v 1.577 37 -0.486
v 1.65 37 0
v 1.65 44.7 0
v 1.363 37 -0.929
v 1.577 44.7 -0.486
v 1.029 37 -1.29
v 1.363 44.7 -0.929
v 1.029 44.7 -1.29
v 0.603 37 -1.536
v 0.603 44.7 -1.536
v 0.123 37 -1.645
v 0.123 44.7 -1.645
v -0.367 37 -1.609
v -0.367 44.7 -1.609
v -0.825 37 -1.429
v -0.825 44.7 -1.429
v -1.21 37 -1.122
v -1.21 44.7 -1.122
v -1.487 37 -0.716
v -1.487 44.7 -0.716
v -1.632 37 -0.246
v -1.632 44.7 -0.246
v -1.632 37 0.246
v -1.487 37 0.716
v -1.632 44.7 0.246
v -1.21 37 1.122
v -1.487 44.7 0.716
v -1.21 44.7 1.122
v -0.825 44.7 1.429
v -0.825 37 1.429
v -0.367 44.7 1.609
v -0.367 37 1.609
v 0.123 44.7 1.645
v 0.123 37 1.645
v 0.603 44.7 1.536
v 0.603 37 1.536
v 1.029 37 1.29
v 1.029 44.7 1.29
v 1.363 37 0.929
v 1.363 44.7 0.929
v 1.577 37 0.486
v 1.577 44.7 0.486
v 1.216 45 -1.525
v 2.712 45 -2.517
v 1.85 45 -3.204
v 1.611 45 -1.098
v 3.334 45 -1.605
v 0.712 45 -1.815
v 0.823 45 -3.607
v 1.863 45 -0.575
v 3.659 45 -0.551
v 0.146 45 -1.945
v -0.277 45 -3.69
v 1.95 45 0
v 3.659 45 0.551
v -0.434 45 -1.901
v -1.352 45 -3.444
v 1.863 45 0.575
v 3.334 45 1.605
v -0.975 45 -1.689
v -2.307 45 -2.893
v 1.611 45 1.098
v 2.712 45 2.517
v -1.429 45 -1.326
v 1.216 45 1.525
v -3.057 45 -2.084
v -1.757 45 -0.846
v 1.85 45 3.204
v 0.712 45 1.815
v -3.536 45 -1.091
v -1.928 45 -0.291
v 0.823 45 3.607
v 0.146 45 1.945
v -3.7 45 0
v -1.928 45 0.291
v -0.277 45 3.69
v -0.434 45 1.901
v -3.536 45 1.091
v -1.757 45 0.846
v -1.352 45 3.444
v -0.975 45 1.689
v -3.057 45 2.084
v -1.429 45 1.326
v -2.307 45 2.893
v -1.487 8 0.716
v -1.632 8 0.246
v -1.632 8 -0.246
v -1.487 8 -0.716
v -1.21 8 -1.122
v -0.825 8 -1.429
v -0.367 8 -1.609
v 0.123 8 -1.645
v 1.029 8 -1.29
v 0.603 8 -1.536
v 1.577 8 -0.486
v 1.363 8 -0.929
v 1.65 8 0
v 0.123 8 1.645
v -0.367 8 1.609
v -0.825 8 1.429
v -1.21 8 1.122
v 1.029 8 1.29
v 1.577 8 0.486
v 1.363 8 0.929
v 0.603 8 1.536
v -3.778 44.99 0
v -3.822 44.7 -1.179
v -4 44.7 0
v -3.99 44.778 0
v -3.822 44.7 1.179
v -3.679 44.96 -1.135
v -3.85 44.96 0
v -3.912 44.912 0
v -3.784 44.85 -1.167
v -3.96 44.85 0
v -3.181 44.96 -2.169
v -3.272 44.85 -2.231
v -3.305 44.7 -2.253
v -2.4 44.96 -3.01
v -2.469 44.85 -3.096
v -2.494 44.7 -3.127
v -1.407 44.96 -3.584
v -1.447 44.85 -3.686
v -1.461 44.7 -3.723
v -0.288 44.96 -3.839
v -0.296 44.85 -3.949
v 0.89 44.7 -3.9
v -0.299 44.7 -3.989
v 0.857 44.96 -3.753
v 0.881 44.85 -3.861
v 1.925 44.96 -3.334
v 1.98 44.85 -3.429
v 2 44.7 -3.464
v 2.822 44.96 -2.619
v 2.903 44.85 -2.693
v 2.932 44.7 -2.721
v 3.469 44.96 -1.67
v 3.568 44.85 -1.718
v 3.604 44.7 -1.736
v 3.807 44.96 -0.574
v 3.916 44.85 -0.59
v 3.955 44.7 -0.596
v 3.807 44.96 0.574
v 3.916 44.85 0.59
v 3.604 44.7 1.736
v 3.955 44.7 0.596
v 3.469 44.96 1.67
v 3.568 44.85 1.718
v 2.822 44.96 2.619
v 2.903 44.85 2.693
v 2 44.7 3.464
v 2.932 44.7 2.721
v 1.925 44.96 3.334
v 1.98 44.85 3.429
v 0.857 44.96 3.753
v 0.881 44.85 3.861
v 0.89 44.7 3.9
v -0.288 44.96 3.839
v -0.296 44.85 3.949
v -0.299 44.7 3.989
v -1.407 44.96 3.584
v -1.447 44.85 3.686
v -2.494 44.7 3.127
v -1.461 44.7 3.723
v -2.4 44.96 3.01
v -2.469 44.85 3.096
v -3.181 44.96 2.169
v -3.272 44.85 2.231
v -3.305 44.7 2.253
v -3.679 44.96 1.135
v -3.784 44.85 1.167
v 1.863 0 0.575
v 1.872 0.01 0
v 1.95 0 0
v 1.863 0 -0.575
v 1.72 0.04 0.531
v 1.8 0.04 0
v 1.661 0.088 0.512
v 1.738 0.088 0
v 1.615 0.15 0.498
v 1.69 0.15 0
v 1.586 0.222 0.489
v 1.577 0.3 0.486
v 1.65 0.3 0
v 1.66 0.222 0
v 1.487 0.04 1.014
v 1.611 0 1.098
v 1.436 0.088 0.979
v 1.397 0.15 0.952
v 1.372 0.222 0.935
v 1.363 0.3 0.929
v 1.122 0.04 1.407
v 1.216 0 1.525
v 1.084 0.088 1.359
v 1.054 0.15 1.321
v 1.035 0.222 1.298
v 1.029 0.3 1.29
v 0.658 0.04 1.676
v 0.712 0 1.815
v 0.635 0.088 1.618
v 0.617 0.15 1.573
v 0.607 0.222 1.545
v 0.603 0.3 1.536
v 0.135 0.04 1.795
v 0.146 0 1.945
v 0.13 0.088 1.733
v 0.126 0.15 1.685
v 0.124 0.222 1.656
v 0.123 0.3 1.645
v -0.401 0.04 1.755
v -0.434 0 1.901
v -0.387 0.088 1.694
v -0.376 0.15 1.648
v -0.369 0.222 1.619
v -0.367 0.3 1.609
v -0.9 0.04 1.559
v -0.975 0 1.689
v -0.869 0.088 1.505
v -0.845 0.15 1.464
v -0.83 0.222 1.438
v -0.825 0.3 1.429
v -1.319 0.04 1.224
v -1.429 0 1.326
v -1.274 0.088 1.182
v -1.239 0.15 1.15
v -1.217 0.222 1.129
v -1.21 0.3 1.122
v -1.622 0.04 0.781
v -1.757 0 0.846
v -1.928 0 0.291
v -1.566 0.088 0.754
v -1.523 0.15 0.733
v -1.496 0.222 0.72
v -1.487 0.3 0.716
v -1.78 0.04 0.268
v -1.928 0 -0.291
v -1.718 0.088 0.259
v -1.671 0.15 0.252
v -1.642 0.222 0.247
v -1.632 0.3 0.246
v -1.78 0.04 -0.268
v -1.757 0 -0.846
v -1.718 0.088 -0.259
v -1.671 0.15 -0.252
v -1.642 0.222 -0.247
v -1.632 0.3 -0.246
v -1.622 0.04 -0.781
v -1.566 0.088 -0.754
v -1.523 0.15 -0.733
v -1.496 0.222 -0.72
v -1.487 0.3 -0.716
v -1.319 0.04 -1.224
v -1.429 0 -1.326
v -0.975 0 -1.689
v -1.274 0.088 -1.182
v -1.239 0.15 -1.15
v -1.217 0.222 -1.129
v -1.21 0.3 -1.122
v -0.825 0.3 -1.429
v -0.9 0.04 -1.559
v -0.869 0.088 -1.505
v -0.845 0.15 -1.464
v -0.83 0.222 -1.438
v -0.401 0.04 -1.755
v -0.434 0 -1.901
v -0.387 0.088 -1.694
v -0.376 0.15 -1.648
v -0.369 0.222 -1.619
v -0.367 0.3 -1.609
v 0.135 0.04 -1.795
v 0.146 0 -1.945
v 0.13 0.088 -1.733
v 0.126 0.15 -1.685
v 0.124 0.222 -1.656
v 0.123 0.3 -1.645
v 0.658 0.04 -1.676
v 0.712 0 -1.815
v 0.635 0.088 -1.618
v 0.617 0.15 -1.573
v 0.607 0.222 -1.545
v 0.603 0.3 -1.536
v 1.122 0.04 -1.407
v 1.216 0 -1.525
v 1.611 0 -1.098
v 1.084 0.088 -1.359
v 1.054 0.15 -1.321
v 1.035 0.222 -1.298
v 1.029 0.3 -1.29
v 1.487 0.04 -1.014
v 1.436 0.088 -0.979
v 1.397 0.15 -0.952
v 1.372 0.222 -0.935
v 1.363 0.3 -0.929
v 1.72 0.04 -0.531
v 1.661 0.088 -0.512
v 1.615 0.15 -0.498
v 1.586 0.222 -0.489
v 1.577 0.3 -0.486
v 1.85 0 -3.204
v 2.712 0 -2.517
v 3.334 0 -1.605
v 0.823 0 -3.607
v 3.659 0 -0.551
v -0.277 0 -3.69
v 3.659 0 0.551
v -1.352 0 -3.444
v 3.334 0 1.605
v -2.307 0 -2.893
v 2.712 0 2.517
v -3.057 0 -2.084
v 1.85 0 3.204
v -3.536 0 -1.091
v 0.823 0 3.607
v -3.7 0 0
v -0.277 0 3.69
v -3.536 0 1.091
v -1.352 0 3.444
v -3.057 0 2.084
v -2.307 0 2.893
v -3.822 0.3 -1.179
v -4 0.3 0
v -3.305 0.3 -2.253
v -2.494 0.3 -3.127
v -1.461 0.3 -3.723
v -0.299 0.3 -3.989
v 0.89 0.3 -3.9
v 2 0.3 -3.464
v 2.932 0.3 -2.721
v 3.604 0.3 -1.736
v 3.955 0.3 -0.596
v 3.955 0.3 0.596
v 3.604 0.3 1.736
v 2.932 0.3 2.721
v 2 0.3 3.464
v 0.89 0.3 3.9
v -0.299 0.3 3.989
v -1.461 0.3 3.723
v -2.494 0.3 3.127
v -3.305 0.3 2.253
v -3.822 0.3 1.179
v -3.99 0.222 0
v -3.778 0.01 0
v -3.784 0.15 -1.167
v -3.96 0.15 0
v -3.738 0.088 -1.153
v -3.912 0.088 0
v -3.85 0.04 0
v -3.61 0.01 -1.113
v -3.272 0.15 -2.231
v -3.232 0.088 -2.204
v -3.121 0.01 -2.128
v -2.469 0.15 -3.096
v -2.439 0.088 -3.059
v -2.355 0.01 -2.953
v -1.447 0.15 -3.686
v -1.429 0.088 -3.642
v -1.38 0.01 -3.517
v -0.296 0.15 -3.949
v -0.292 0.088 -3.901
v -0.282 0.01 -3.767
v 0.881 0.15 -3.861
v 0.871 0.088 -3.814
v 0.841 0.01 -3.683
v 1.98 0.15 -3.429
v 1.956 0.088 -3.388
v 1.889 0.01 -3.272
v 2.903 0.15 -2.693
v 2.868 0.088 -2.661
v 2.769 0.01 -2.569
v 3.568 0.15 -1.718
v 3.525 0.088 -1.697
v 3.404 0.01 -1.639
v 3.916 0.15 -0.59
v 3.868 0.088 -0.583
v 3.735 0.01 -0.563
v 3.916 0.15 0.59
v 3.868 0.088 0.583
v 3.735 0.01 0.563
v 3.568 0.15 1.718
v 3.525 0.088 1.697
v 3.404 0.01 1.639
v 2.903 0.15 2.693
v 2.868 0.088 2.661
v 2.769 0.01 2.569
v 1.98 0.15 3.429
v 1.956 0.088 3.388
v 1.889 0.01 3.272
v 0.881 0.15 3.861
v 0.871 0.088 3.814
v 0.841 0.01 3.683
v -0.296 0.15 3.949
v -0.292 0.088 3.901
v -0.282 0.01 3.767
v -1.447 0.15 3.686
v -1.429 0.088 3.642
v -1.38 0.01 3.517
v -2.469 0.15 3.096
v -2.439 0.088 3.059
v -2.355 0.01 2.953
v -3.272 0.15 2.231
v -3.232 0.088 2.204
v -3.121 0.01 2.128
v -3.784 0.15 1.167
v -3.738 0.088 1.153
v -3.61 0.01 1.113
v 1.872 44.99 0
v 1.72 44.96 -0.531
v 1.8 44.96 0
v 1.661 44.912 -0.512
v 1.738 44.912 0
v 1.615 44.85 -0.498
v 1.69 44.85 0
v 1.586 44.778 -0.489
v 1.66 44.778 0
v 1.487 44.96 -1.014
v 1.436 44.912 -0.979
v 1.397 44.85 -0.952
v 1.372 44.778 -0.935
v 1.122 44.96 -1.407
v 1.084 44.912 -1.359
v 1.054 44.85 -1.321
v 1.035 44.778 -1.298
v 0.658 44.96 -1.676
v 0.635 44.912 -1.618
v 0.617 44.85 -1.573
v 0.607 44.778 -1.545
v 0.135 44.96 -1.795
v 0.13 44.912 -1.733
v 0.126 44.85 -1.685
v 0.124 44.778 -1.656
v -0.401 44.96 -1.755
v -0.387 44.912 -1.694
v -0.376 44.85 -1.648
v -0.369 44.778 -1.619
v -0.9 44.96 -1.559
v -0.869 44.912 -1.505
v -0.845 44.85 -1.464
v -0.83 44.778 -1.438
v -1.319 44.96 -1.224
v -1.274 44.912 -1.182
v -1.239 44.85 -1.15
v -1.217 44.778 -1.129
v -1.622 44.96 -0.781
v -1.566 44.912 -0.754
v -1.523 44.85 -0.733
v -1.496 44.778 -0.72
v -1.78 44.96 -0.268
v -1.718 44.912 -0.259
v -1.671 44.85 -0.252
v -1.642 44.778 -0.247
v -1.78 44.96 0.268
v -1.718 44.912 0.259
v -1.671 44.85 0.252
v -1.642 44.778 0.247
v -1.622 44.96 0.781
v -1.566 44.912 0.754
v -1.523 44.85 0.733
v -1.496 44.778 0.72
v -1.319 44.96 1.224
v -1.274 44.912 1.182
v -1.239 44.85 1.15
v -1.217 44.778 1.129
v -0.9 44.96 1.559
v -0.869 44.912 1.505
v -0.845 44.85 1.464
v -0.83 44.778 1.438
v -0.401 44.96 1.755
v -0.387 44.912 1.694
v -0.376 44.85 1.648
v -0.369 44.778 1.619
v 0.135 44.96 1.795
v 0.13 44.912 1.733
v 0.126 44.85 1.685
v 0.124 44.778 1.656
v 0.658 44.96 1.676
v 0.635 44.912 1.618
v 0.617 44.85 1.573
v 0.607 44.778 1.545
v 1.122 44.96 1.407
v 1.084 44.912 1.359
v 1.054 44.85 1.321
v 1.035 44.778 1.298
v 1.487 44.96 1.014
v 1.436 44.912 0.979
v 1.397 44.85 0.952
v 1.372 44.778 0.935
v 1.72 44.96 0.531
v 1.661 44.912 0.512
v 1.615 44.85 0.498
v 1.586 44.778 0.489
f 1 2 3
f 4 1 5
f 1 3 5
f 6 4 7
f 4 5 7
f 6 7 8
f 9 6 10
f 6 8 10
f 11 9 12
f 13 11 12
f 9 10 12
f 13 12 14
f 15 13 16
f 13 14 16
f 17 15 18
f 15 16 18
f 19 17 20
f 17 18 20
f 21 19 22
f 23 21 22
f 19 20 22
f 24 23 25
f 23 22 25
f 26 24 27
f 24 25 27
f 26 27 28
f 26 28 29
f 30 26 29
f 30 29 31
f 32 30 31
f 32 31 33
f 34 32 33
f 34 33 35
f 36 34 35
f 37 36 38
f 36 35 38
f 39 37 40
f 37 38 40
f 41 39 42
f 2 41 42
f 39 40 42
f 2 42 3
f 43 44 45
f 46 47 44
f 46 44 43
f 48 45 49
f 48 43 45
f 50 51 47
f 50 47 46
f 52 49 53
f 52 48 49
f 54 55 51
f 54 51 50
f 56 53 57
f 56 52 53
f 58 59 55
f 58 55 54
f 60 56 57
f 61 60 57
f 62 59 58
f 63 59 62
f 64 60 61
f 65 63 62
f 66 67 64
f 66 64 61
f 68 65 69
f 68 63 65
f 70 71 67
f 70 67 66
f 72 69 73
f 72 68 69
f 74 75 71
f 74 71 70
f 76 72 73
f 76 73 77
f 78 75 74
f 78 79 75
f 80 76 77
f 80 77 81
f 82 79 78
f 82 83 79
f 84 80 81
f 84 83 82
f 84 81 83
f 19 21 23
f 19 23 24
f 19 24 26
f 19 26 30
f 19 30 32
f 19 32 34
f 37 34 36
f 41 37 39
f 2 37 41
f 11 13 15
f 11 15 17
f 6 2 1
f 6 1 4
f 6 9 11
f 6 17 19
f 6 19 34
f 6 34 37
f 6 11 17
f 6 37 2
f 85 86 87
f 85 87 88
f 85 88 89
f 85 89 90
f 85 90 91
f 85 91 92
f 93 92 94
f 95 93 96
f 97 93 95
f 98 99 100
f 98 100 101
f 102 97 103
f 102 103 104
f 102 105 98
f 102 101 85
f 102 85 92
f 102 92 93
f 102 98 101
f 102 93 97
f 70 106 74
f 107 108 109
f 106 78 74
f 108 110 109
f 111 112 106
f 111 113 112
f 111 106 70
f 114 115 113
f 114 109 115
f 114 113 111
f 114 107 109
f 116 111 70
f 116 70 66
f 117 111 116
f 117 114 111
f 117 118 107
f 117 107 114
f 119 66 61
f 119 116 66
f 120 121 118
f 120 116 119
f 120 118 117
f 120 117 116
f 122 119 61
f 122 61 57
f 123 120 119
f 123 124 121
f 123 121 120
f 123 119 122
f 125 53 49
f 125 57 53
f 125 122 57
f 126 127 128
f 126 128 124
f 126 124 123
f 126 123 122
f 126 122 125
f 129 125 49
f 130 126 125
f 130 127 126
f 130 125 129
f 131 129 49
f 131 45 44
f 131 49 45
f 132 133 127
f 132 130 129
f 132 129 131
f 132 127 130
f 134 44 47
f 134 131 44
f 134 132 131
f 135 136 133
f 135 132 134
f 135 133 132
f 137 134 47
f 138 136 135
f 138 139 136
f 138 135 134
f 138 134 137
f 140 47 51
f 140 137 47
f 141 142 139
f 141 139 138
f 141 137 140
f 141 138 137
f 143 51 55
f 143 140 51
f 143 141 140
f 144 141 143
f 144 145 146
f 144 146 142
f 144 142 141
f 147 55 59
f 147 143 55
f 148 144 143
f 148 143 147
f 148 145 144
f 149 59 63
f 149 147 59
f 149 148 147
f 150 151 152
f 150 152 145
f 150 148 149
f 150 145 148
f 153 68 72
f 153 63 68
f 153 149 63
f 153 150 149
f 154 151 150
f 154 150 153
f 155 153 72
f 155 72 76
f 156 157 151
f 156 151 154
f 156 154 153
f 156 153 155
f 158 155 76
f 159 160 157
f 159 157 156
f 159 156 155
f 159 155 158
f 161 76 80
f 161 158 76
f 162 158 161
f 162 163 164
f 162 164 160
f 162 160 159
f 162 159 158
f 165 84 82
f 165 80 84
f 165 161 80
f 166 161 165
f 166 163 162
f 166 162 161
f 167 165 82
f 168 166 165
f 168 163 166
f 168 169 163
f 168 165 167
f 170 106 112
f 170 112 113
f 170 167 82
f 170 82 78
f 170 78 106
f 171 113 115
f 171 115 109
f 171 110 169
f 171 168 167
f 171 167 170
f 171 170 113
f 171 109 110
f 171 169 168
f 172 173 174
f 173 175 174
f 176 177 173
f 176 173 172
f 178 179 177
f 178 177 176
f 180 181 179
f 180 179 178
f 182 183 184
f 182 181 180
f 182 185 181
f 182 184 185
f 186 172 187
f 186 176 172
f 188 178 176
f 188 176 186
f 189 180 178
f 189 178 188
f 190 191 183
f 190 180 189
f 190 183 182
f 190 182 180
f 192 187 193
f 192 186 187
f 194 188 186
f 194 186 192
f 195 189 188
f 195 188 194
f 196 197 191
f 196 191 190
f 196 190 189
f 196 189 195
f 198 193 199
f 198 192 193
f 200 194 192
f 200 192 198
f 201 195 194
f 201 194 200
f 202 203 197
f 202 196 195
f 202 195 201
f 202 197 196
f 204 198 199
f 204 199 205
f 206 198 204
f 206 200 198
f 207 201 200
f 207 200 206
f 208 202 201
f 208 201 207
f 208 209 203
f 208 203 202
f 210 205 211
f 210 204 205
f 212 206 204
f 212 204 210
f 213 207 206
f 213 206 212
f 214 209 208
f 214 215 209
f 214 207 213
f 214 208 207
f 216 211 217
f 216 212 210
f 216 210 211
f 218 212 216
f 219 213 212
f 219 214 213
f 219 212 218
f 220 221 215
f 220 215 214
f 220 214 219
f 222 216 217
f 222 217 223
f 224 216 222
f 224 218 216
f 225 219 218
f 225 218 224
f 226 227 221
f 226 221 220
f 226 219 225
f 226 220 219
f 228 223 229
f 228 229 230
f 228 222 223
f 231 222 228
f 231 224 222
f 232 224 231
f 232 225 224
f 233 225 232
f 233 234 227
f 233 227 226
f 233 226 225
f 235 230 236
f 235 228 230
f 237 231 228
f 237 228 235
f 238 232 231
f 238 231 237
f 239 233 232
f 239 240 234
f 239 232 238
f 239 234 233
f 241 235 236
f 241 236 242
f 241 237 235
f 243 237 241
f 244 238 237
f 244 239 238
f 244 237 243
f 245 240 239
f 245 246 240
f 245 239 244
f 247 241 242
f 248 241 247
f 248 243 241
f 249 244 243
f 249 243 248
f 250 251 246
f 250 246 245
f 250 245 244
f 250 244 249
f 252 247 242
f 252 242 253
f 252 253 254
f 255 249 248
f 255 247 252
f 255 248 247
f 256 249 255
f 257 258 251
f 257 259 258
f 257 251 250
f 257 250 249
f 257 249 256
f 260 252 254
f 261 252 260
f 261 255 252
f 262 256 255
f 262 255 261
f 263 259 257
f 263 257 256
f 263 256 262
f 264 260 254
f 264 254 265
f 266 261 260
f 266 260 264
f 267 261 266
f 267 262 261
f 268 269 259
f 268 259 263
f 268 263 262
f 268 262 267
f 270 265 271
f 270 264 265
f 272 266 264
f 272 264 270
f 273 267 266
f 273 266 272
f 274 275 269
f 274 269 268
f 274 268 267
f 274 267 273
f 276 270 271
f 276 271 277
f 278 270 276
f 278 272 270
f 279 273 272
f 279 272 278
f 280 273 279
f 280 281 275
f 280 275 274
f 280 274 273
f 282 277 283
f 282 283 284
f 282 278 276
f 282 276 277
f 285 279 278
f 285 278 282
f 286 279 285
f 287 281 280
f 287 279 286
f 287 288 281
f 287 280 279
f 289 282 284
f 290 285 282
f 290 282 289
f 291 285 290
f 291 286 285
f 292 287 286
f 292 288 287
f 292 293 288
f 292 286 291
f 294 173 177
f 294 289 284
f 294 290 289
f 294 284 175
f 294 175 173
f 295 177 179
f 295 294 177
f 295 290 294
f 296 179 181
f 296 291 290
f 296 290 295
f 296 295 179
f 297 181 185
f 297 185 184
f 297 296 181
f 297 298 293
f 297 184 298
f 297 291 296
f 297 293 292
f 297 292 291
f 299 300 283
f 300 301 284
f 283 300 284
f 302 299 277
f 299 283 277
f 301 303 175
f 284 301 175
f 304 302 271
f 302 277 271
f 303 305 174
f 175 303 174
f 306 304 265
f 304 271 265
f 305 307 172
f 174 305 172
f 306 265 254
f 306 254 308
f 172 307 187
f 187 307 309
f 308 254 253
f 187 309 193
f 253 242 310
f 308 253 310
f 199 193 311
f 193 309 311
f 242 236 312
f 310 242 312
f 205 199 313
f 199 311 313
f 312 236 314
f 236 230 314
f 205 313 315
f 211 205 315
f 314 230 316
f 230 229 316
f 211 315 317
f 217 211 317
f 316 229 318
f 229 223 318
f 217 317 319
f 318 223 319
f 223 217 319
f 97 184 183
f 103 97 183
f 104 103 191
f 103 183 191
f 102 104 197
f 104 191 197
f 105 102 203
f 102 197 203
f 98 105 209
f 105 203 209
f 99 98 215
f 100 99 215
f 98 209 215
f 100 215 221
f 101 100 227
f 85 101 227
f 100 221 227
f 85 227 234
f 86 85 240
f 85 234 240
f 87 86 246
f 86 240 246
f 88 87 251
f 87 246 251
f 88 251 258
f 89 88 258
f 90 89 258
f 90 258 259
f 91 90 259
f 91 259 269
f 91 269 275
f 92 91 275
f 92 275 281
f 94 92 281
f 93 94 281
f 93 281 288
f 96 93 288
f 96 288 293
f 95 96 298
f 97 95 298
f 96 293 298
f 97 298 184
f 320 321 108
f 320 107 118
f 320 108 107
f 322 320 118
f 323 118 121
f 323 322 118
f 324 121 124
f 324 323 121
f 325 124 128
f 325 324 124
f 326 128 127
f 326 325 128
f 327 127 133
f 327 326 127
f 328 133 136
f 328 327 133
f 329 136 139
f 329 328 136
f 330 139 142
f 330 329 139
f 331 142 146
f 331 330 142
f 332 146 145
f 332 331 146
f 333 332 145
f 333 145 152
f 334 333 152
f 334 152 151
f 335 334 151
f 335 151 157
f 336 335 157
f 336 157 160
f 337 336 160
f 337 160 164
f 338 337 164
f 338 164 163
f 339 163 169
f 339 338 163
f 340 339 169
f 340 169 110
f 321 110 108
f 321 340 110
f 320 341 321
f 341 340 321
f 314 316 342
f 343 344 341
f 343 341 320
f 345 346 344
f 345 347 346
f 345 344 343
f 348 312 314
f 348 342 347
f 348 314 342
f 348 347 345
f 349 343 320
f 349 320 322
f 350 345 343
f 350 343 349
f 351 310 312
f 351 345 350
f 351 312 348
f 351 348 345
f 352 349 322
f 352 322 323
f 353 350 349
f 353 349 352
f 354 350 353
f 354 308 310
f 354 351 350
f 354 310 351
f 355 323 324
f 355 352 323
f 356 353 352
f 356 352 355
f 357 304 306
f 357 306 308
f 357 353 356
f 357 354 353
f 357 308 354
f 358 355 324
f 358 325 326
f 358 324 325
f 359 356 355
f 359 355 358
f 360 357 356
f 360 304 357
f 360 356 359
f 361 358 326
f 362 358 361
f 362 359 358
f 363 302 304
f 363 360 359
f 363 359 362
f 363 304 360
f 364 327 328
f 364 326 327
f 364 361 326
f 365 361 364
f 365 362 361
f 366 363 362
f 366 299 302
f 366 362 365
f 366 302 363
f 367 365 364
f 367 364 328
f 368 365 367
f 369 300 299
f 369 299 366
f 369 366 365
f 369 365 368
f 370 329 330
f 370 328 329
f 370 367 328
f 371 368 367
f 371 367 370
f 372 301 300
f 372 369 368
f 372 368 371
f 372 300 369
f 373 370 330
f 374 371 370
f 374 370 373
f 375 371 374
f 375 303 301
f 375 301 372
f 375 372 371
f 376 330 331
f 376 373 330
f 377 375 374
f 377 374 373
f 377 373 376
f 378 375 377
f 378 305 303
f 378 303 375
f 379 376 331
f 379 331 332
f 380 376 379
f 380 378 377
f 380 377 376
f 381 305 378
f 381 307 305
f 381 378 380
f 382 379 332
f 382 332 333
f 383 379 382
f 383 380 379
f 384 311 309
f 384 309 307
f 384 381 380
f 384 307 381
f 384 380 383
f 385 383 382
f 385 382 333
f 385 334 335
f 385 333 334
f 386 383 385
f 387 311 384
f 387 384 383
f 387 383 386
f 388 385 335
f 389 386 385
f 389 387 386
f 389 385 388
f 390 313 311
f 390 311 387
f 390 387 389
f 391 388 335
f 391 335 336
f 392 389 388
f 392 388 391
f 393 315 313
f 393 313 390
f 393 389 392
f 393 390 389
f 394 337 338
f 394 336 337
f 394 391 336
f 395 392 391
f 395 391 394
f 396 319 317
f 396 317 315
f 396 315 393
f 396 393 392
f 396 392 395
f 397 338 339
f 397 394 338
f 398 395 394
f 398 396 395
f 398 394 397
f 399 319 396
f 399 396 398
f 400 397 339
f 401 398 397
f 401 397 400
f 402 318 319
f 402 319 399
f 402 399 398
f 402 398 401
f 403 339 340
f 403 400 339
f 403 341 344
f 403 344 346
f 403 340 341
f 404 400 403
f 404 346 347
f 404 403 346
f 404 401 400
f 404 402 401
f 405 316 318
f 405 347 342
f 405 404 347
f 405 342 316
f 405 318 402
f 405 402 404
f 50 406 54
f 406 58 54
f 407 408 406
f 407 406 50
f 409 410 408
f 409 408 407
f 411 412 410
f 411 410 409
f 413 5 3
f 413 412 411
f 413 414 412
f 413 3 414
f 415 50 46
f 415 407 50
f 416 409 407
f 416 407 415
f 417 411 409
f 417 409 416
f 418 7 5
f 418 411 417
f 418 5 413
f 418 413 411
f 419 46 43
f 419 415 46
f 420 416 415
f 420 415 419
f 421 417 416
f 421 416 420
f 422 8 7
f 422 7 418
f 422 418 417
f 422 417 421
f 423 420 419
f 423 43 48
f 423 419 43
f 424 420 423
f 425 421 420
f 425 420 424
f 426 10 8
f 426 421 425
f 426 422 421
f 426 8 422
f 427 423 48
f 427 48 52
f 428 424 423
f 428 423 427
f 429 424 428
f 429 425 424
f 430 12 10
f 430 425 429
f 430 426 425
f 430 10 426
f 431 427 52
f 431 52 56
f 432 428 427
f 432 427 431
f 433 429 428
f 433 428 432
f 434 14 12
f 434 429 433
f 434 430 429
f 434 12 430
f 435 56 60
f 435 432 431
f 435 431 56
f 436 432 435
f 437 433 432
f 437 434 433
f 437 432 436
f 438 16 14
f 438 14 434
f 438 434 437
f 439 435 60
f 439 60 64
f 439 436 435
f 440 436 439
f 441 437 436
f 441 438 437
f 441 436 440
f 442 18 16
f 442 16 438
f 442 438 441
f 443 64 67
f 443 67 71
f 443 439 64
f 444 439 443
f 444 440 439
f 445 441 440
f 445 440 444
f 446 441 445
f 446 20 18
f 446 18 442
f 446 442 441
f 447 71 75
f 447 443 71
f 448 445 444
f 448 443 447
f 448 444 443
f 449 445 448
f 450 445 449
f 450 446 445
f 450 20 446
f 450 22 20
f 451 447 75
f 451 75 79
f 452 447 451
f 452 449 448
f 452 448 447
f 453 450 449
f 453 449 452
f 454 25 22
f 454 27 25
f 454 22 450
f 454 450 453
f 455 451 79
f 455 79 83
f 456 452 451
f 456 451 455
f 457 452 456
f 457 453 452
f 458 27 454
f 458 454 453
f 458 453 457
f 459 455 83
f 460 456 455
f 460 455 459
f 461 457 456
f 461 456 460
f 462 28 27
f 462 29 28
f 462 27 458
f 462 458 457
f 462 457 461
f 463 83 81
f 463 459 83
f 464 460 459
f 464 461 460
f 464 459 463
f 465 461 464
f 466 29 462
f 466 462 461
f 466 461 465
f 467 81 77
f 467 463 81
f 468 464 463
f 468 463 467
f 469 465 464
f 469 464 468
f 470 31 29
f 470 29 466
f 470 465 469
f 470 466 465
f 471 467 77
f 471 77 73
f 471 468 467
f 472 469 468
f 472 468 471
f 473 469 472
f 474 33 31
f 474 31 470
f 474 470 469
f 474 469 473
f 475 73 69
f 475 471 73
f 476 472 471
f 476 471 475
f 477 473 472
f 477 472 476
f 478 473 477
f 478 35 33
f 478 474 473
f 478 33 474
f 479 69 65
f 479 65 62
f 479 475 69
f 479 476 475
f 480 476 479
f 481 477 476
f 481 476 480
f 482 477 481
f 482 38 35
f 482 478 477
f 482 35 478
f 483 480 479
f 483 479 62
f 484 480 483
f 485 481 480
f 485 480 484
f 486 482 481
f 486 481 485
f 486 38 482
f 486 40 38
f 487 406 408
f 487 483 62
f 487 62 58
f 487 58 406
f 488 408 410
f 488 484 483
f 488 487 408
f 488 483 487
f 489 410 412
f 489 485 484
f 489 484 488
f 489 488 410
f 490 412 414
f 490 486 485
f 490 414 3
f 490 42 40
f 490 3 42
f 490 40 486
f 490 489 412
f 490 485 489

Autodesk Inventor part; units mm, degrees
ref_plane "YZ Plane" through (0, 0, 0) normal (1, 0, 0) x (0, 1, 0)
ref_plane "XZ Plane" through (0, 0, 0) normal (0, 1, 0) x (-1, 0, 0)
ref_plane "XY Plane" through (0, 0, 0) normal (0, 0, 1) x (1, 0, 0)
sketch "スケッチ1" plane through (0, 0, 0) normal (0, 1, 0) x (-1, 0, 0)
  circle A0 centre (0, 0) radius 4
  dimension "d0" = 8
extrude "押し出し1" add sketch "スケッチ1" along normal blind 45
sketch "スケッチ2" plane through (0, 45, 0) normal (0, 1, 0) x (1, 0, 0)
  circle A0 centre (0, 0) radius 1.65
  dimension "d3" = 3.3
extrude "押し出し2" cut sketch "スケッチ2" against normal blind 8
thread "ねじ1" size "M4x0.7" class "6H" standard "ISO Metric profile" full length
sketch "スケッチ3" plane through (0, 0, 0) normal (0, -1, 0) x (1, 0, 0)
  circle A0 centre (0, 0) radius 1.65
  dimension "d8" = 3.3
extrude "押し出し3" cut sketch "スケッチ3" against normal blind 8
thread "ねじ2" size "M4x0.7" class "6H" standard "ISO Metric profile" full length
fillet "フィレット1" radius 0.3 1 edges at (-1.65, 0, 0)
fillet "フィレット2" radius 0.3 1 edges at (-1.65, 45, 0)
fillet "フィレット3" radius 0.3 2 edges at (4, 45, 0) (4, 0, 0)
properties part number "ARL-445KE"
